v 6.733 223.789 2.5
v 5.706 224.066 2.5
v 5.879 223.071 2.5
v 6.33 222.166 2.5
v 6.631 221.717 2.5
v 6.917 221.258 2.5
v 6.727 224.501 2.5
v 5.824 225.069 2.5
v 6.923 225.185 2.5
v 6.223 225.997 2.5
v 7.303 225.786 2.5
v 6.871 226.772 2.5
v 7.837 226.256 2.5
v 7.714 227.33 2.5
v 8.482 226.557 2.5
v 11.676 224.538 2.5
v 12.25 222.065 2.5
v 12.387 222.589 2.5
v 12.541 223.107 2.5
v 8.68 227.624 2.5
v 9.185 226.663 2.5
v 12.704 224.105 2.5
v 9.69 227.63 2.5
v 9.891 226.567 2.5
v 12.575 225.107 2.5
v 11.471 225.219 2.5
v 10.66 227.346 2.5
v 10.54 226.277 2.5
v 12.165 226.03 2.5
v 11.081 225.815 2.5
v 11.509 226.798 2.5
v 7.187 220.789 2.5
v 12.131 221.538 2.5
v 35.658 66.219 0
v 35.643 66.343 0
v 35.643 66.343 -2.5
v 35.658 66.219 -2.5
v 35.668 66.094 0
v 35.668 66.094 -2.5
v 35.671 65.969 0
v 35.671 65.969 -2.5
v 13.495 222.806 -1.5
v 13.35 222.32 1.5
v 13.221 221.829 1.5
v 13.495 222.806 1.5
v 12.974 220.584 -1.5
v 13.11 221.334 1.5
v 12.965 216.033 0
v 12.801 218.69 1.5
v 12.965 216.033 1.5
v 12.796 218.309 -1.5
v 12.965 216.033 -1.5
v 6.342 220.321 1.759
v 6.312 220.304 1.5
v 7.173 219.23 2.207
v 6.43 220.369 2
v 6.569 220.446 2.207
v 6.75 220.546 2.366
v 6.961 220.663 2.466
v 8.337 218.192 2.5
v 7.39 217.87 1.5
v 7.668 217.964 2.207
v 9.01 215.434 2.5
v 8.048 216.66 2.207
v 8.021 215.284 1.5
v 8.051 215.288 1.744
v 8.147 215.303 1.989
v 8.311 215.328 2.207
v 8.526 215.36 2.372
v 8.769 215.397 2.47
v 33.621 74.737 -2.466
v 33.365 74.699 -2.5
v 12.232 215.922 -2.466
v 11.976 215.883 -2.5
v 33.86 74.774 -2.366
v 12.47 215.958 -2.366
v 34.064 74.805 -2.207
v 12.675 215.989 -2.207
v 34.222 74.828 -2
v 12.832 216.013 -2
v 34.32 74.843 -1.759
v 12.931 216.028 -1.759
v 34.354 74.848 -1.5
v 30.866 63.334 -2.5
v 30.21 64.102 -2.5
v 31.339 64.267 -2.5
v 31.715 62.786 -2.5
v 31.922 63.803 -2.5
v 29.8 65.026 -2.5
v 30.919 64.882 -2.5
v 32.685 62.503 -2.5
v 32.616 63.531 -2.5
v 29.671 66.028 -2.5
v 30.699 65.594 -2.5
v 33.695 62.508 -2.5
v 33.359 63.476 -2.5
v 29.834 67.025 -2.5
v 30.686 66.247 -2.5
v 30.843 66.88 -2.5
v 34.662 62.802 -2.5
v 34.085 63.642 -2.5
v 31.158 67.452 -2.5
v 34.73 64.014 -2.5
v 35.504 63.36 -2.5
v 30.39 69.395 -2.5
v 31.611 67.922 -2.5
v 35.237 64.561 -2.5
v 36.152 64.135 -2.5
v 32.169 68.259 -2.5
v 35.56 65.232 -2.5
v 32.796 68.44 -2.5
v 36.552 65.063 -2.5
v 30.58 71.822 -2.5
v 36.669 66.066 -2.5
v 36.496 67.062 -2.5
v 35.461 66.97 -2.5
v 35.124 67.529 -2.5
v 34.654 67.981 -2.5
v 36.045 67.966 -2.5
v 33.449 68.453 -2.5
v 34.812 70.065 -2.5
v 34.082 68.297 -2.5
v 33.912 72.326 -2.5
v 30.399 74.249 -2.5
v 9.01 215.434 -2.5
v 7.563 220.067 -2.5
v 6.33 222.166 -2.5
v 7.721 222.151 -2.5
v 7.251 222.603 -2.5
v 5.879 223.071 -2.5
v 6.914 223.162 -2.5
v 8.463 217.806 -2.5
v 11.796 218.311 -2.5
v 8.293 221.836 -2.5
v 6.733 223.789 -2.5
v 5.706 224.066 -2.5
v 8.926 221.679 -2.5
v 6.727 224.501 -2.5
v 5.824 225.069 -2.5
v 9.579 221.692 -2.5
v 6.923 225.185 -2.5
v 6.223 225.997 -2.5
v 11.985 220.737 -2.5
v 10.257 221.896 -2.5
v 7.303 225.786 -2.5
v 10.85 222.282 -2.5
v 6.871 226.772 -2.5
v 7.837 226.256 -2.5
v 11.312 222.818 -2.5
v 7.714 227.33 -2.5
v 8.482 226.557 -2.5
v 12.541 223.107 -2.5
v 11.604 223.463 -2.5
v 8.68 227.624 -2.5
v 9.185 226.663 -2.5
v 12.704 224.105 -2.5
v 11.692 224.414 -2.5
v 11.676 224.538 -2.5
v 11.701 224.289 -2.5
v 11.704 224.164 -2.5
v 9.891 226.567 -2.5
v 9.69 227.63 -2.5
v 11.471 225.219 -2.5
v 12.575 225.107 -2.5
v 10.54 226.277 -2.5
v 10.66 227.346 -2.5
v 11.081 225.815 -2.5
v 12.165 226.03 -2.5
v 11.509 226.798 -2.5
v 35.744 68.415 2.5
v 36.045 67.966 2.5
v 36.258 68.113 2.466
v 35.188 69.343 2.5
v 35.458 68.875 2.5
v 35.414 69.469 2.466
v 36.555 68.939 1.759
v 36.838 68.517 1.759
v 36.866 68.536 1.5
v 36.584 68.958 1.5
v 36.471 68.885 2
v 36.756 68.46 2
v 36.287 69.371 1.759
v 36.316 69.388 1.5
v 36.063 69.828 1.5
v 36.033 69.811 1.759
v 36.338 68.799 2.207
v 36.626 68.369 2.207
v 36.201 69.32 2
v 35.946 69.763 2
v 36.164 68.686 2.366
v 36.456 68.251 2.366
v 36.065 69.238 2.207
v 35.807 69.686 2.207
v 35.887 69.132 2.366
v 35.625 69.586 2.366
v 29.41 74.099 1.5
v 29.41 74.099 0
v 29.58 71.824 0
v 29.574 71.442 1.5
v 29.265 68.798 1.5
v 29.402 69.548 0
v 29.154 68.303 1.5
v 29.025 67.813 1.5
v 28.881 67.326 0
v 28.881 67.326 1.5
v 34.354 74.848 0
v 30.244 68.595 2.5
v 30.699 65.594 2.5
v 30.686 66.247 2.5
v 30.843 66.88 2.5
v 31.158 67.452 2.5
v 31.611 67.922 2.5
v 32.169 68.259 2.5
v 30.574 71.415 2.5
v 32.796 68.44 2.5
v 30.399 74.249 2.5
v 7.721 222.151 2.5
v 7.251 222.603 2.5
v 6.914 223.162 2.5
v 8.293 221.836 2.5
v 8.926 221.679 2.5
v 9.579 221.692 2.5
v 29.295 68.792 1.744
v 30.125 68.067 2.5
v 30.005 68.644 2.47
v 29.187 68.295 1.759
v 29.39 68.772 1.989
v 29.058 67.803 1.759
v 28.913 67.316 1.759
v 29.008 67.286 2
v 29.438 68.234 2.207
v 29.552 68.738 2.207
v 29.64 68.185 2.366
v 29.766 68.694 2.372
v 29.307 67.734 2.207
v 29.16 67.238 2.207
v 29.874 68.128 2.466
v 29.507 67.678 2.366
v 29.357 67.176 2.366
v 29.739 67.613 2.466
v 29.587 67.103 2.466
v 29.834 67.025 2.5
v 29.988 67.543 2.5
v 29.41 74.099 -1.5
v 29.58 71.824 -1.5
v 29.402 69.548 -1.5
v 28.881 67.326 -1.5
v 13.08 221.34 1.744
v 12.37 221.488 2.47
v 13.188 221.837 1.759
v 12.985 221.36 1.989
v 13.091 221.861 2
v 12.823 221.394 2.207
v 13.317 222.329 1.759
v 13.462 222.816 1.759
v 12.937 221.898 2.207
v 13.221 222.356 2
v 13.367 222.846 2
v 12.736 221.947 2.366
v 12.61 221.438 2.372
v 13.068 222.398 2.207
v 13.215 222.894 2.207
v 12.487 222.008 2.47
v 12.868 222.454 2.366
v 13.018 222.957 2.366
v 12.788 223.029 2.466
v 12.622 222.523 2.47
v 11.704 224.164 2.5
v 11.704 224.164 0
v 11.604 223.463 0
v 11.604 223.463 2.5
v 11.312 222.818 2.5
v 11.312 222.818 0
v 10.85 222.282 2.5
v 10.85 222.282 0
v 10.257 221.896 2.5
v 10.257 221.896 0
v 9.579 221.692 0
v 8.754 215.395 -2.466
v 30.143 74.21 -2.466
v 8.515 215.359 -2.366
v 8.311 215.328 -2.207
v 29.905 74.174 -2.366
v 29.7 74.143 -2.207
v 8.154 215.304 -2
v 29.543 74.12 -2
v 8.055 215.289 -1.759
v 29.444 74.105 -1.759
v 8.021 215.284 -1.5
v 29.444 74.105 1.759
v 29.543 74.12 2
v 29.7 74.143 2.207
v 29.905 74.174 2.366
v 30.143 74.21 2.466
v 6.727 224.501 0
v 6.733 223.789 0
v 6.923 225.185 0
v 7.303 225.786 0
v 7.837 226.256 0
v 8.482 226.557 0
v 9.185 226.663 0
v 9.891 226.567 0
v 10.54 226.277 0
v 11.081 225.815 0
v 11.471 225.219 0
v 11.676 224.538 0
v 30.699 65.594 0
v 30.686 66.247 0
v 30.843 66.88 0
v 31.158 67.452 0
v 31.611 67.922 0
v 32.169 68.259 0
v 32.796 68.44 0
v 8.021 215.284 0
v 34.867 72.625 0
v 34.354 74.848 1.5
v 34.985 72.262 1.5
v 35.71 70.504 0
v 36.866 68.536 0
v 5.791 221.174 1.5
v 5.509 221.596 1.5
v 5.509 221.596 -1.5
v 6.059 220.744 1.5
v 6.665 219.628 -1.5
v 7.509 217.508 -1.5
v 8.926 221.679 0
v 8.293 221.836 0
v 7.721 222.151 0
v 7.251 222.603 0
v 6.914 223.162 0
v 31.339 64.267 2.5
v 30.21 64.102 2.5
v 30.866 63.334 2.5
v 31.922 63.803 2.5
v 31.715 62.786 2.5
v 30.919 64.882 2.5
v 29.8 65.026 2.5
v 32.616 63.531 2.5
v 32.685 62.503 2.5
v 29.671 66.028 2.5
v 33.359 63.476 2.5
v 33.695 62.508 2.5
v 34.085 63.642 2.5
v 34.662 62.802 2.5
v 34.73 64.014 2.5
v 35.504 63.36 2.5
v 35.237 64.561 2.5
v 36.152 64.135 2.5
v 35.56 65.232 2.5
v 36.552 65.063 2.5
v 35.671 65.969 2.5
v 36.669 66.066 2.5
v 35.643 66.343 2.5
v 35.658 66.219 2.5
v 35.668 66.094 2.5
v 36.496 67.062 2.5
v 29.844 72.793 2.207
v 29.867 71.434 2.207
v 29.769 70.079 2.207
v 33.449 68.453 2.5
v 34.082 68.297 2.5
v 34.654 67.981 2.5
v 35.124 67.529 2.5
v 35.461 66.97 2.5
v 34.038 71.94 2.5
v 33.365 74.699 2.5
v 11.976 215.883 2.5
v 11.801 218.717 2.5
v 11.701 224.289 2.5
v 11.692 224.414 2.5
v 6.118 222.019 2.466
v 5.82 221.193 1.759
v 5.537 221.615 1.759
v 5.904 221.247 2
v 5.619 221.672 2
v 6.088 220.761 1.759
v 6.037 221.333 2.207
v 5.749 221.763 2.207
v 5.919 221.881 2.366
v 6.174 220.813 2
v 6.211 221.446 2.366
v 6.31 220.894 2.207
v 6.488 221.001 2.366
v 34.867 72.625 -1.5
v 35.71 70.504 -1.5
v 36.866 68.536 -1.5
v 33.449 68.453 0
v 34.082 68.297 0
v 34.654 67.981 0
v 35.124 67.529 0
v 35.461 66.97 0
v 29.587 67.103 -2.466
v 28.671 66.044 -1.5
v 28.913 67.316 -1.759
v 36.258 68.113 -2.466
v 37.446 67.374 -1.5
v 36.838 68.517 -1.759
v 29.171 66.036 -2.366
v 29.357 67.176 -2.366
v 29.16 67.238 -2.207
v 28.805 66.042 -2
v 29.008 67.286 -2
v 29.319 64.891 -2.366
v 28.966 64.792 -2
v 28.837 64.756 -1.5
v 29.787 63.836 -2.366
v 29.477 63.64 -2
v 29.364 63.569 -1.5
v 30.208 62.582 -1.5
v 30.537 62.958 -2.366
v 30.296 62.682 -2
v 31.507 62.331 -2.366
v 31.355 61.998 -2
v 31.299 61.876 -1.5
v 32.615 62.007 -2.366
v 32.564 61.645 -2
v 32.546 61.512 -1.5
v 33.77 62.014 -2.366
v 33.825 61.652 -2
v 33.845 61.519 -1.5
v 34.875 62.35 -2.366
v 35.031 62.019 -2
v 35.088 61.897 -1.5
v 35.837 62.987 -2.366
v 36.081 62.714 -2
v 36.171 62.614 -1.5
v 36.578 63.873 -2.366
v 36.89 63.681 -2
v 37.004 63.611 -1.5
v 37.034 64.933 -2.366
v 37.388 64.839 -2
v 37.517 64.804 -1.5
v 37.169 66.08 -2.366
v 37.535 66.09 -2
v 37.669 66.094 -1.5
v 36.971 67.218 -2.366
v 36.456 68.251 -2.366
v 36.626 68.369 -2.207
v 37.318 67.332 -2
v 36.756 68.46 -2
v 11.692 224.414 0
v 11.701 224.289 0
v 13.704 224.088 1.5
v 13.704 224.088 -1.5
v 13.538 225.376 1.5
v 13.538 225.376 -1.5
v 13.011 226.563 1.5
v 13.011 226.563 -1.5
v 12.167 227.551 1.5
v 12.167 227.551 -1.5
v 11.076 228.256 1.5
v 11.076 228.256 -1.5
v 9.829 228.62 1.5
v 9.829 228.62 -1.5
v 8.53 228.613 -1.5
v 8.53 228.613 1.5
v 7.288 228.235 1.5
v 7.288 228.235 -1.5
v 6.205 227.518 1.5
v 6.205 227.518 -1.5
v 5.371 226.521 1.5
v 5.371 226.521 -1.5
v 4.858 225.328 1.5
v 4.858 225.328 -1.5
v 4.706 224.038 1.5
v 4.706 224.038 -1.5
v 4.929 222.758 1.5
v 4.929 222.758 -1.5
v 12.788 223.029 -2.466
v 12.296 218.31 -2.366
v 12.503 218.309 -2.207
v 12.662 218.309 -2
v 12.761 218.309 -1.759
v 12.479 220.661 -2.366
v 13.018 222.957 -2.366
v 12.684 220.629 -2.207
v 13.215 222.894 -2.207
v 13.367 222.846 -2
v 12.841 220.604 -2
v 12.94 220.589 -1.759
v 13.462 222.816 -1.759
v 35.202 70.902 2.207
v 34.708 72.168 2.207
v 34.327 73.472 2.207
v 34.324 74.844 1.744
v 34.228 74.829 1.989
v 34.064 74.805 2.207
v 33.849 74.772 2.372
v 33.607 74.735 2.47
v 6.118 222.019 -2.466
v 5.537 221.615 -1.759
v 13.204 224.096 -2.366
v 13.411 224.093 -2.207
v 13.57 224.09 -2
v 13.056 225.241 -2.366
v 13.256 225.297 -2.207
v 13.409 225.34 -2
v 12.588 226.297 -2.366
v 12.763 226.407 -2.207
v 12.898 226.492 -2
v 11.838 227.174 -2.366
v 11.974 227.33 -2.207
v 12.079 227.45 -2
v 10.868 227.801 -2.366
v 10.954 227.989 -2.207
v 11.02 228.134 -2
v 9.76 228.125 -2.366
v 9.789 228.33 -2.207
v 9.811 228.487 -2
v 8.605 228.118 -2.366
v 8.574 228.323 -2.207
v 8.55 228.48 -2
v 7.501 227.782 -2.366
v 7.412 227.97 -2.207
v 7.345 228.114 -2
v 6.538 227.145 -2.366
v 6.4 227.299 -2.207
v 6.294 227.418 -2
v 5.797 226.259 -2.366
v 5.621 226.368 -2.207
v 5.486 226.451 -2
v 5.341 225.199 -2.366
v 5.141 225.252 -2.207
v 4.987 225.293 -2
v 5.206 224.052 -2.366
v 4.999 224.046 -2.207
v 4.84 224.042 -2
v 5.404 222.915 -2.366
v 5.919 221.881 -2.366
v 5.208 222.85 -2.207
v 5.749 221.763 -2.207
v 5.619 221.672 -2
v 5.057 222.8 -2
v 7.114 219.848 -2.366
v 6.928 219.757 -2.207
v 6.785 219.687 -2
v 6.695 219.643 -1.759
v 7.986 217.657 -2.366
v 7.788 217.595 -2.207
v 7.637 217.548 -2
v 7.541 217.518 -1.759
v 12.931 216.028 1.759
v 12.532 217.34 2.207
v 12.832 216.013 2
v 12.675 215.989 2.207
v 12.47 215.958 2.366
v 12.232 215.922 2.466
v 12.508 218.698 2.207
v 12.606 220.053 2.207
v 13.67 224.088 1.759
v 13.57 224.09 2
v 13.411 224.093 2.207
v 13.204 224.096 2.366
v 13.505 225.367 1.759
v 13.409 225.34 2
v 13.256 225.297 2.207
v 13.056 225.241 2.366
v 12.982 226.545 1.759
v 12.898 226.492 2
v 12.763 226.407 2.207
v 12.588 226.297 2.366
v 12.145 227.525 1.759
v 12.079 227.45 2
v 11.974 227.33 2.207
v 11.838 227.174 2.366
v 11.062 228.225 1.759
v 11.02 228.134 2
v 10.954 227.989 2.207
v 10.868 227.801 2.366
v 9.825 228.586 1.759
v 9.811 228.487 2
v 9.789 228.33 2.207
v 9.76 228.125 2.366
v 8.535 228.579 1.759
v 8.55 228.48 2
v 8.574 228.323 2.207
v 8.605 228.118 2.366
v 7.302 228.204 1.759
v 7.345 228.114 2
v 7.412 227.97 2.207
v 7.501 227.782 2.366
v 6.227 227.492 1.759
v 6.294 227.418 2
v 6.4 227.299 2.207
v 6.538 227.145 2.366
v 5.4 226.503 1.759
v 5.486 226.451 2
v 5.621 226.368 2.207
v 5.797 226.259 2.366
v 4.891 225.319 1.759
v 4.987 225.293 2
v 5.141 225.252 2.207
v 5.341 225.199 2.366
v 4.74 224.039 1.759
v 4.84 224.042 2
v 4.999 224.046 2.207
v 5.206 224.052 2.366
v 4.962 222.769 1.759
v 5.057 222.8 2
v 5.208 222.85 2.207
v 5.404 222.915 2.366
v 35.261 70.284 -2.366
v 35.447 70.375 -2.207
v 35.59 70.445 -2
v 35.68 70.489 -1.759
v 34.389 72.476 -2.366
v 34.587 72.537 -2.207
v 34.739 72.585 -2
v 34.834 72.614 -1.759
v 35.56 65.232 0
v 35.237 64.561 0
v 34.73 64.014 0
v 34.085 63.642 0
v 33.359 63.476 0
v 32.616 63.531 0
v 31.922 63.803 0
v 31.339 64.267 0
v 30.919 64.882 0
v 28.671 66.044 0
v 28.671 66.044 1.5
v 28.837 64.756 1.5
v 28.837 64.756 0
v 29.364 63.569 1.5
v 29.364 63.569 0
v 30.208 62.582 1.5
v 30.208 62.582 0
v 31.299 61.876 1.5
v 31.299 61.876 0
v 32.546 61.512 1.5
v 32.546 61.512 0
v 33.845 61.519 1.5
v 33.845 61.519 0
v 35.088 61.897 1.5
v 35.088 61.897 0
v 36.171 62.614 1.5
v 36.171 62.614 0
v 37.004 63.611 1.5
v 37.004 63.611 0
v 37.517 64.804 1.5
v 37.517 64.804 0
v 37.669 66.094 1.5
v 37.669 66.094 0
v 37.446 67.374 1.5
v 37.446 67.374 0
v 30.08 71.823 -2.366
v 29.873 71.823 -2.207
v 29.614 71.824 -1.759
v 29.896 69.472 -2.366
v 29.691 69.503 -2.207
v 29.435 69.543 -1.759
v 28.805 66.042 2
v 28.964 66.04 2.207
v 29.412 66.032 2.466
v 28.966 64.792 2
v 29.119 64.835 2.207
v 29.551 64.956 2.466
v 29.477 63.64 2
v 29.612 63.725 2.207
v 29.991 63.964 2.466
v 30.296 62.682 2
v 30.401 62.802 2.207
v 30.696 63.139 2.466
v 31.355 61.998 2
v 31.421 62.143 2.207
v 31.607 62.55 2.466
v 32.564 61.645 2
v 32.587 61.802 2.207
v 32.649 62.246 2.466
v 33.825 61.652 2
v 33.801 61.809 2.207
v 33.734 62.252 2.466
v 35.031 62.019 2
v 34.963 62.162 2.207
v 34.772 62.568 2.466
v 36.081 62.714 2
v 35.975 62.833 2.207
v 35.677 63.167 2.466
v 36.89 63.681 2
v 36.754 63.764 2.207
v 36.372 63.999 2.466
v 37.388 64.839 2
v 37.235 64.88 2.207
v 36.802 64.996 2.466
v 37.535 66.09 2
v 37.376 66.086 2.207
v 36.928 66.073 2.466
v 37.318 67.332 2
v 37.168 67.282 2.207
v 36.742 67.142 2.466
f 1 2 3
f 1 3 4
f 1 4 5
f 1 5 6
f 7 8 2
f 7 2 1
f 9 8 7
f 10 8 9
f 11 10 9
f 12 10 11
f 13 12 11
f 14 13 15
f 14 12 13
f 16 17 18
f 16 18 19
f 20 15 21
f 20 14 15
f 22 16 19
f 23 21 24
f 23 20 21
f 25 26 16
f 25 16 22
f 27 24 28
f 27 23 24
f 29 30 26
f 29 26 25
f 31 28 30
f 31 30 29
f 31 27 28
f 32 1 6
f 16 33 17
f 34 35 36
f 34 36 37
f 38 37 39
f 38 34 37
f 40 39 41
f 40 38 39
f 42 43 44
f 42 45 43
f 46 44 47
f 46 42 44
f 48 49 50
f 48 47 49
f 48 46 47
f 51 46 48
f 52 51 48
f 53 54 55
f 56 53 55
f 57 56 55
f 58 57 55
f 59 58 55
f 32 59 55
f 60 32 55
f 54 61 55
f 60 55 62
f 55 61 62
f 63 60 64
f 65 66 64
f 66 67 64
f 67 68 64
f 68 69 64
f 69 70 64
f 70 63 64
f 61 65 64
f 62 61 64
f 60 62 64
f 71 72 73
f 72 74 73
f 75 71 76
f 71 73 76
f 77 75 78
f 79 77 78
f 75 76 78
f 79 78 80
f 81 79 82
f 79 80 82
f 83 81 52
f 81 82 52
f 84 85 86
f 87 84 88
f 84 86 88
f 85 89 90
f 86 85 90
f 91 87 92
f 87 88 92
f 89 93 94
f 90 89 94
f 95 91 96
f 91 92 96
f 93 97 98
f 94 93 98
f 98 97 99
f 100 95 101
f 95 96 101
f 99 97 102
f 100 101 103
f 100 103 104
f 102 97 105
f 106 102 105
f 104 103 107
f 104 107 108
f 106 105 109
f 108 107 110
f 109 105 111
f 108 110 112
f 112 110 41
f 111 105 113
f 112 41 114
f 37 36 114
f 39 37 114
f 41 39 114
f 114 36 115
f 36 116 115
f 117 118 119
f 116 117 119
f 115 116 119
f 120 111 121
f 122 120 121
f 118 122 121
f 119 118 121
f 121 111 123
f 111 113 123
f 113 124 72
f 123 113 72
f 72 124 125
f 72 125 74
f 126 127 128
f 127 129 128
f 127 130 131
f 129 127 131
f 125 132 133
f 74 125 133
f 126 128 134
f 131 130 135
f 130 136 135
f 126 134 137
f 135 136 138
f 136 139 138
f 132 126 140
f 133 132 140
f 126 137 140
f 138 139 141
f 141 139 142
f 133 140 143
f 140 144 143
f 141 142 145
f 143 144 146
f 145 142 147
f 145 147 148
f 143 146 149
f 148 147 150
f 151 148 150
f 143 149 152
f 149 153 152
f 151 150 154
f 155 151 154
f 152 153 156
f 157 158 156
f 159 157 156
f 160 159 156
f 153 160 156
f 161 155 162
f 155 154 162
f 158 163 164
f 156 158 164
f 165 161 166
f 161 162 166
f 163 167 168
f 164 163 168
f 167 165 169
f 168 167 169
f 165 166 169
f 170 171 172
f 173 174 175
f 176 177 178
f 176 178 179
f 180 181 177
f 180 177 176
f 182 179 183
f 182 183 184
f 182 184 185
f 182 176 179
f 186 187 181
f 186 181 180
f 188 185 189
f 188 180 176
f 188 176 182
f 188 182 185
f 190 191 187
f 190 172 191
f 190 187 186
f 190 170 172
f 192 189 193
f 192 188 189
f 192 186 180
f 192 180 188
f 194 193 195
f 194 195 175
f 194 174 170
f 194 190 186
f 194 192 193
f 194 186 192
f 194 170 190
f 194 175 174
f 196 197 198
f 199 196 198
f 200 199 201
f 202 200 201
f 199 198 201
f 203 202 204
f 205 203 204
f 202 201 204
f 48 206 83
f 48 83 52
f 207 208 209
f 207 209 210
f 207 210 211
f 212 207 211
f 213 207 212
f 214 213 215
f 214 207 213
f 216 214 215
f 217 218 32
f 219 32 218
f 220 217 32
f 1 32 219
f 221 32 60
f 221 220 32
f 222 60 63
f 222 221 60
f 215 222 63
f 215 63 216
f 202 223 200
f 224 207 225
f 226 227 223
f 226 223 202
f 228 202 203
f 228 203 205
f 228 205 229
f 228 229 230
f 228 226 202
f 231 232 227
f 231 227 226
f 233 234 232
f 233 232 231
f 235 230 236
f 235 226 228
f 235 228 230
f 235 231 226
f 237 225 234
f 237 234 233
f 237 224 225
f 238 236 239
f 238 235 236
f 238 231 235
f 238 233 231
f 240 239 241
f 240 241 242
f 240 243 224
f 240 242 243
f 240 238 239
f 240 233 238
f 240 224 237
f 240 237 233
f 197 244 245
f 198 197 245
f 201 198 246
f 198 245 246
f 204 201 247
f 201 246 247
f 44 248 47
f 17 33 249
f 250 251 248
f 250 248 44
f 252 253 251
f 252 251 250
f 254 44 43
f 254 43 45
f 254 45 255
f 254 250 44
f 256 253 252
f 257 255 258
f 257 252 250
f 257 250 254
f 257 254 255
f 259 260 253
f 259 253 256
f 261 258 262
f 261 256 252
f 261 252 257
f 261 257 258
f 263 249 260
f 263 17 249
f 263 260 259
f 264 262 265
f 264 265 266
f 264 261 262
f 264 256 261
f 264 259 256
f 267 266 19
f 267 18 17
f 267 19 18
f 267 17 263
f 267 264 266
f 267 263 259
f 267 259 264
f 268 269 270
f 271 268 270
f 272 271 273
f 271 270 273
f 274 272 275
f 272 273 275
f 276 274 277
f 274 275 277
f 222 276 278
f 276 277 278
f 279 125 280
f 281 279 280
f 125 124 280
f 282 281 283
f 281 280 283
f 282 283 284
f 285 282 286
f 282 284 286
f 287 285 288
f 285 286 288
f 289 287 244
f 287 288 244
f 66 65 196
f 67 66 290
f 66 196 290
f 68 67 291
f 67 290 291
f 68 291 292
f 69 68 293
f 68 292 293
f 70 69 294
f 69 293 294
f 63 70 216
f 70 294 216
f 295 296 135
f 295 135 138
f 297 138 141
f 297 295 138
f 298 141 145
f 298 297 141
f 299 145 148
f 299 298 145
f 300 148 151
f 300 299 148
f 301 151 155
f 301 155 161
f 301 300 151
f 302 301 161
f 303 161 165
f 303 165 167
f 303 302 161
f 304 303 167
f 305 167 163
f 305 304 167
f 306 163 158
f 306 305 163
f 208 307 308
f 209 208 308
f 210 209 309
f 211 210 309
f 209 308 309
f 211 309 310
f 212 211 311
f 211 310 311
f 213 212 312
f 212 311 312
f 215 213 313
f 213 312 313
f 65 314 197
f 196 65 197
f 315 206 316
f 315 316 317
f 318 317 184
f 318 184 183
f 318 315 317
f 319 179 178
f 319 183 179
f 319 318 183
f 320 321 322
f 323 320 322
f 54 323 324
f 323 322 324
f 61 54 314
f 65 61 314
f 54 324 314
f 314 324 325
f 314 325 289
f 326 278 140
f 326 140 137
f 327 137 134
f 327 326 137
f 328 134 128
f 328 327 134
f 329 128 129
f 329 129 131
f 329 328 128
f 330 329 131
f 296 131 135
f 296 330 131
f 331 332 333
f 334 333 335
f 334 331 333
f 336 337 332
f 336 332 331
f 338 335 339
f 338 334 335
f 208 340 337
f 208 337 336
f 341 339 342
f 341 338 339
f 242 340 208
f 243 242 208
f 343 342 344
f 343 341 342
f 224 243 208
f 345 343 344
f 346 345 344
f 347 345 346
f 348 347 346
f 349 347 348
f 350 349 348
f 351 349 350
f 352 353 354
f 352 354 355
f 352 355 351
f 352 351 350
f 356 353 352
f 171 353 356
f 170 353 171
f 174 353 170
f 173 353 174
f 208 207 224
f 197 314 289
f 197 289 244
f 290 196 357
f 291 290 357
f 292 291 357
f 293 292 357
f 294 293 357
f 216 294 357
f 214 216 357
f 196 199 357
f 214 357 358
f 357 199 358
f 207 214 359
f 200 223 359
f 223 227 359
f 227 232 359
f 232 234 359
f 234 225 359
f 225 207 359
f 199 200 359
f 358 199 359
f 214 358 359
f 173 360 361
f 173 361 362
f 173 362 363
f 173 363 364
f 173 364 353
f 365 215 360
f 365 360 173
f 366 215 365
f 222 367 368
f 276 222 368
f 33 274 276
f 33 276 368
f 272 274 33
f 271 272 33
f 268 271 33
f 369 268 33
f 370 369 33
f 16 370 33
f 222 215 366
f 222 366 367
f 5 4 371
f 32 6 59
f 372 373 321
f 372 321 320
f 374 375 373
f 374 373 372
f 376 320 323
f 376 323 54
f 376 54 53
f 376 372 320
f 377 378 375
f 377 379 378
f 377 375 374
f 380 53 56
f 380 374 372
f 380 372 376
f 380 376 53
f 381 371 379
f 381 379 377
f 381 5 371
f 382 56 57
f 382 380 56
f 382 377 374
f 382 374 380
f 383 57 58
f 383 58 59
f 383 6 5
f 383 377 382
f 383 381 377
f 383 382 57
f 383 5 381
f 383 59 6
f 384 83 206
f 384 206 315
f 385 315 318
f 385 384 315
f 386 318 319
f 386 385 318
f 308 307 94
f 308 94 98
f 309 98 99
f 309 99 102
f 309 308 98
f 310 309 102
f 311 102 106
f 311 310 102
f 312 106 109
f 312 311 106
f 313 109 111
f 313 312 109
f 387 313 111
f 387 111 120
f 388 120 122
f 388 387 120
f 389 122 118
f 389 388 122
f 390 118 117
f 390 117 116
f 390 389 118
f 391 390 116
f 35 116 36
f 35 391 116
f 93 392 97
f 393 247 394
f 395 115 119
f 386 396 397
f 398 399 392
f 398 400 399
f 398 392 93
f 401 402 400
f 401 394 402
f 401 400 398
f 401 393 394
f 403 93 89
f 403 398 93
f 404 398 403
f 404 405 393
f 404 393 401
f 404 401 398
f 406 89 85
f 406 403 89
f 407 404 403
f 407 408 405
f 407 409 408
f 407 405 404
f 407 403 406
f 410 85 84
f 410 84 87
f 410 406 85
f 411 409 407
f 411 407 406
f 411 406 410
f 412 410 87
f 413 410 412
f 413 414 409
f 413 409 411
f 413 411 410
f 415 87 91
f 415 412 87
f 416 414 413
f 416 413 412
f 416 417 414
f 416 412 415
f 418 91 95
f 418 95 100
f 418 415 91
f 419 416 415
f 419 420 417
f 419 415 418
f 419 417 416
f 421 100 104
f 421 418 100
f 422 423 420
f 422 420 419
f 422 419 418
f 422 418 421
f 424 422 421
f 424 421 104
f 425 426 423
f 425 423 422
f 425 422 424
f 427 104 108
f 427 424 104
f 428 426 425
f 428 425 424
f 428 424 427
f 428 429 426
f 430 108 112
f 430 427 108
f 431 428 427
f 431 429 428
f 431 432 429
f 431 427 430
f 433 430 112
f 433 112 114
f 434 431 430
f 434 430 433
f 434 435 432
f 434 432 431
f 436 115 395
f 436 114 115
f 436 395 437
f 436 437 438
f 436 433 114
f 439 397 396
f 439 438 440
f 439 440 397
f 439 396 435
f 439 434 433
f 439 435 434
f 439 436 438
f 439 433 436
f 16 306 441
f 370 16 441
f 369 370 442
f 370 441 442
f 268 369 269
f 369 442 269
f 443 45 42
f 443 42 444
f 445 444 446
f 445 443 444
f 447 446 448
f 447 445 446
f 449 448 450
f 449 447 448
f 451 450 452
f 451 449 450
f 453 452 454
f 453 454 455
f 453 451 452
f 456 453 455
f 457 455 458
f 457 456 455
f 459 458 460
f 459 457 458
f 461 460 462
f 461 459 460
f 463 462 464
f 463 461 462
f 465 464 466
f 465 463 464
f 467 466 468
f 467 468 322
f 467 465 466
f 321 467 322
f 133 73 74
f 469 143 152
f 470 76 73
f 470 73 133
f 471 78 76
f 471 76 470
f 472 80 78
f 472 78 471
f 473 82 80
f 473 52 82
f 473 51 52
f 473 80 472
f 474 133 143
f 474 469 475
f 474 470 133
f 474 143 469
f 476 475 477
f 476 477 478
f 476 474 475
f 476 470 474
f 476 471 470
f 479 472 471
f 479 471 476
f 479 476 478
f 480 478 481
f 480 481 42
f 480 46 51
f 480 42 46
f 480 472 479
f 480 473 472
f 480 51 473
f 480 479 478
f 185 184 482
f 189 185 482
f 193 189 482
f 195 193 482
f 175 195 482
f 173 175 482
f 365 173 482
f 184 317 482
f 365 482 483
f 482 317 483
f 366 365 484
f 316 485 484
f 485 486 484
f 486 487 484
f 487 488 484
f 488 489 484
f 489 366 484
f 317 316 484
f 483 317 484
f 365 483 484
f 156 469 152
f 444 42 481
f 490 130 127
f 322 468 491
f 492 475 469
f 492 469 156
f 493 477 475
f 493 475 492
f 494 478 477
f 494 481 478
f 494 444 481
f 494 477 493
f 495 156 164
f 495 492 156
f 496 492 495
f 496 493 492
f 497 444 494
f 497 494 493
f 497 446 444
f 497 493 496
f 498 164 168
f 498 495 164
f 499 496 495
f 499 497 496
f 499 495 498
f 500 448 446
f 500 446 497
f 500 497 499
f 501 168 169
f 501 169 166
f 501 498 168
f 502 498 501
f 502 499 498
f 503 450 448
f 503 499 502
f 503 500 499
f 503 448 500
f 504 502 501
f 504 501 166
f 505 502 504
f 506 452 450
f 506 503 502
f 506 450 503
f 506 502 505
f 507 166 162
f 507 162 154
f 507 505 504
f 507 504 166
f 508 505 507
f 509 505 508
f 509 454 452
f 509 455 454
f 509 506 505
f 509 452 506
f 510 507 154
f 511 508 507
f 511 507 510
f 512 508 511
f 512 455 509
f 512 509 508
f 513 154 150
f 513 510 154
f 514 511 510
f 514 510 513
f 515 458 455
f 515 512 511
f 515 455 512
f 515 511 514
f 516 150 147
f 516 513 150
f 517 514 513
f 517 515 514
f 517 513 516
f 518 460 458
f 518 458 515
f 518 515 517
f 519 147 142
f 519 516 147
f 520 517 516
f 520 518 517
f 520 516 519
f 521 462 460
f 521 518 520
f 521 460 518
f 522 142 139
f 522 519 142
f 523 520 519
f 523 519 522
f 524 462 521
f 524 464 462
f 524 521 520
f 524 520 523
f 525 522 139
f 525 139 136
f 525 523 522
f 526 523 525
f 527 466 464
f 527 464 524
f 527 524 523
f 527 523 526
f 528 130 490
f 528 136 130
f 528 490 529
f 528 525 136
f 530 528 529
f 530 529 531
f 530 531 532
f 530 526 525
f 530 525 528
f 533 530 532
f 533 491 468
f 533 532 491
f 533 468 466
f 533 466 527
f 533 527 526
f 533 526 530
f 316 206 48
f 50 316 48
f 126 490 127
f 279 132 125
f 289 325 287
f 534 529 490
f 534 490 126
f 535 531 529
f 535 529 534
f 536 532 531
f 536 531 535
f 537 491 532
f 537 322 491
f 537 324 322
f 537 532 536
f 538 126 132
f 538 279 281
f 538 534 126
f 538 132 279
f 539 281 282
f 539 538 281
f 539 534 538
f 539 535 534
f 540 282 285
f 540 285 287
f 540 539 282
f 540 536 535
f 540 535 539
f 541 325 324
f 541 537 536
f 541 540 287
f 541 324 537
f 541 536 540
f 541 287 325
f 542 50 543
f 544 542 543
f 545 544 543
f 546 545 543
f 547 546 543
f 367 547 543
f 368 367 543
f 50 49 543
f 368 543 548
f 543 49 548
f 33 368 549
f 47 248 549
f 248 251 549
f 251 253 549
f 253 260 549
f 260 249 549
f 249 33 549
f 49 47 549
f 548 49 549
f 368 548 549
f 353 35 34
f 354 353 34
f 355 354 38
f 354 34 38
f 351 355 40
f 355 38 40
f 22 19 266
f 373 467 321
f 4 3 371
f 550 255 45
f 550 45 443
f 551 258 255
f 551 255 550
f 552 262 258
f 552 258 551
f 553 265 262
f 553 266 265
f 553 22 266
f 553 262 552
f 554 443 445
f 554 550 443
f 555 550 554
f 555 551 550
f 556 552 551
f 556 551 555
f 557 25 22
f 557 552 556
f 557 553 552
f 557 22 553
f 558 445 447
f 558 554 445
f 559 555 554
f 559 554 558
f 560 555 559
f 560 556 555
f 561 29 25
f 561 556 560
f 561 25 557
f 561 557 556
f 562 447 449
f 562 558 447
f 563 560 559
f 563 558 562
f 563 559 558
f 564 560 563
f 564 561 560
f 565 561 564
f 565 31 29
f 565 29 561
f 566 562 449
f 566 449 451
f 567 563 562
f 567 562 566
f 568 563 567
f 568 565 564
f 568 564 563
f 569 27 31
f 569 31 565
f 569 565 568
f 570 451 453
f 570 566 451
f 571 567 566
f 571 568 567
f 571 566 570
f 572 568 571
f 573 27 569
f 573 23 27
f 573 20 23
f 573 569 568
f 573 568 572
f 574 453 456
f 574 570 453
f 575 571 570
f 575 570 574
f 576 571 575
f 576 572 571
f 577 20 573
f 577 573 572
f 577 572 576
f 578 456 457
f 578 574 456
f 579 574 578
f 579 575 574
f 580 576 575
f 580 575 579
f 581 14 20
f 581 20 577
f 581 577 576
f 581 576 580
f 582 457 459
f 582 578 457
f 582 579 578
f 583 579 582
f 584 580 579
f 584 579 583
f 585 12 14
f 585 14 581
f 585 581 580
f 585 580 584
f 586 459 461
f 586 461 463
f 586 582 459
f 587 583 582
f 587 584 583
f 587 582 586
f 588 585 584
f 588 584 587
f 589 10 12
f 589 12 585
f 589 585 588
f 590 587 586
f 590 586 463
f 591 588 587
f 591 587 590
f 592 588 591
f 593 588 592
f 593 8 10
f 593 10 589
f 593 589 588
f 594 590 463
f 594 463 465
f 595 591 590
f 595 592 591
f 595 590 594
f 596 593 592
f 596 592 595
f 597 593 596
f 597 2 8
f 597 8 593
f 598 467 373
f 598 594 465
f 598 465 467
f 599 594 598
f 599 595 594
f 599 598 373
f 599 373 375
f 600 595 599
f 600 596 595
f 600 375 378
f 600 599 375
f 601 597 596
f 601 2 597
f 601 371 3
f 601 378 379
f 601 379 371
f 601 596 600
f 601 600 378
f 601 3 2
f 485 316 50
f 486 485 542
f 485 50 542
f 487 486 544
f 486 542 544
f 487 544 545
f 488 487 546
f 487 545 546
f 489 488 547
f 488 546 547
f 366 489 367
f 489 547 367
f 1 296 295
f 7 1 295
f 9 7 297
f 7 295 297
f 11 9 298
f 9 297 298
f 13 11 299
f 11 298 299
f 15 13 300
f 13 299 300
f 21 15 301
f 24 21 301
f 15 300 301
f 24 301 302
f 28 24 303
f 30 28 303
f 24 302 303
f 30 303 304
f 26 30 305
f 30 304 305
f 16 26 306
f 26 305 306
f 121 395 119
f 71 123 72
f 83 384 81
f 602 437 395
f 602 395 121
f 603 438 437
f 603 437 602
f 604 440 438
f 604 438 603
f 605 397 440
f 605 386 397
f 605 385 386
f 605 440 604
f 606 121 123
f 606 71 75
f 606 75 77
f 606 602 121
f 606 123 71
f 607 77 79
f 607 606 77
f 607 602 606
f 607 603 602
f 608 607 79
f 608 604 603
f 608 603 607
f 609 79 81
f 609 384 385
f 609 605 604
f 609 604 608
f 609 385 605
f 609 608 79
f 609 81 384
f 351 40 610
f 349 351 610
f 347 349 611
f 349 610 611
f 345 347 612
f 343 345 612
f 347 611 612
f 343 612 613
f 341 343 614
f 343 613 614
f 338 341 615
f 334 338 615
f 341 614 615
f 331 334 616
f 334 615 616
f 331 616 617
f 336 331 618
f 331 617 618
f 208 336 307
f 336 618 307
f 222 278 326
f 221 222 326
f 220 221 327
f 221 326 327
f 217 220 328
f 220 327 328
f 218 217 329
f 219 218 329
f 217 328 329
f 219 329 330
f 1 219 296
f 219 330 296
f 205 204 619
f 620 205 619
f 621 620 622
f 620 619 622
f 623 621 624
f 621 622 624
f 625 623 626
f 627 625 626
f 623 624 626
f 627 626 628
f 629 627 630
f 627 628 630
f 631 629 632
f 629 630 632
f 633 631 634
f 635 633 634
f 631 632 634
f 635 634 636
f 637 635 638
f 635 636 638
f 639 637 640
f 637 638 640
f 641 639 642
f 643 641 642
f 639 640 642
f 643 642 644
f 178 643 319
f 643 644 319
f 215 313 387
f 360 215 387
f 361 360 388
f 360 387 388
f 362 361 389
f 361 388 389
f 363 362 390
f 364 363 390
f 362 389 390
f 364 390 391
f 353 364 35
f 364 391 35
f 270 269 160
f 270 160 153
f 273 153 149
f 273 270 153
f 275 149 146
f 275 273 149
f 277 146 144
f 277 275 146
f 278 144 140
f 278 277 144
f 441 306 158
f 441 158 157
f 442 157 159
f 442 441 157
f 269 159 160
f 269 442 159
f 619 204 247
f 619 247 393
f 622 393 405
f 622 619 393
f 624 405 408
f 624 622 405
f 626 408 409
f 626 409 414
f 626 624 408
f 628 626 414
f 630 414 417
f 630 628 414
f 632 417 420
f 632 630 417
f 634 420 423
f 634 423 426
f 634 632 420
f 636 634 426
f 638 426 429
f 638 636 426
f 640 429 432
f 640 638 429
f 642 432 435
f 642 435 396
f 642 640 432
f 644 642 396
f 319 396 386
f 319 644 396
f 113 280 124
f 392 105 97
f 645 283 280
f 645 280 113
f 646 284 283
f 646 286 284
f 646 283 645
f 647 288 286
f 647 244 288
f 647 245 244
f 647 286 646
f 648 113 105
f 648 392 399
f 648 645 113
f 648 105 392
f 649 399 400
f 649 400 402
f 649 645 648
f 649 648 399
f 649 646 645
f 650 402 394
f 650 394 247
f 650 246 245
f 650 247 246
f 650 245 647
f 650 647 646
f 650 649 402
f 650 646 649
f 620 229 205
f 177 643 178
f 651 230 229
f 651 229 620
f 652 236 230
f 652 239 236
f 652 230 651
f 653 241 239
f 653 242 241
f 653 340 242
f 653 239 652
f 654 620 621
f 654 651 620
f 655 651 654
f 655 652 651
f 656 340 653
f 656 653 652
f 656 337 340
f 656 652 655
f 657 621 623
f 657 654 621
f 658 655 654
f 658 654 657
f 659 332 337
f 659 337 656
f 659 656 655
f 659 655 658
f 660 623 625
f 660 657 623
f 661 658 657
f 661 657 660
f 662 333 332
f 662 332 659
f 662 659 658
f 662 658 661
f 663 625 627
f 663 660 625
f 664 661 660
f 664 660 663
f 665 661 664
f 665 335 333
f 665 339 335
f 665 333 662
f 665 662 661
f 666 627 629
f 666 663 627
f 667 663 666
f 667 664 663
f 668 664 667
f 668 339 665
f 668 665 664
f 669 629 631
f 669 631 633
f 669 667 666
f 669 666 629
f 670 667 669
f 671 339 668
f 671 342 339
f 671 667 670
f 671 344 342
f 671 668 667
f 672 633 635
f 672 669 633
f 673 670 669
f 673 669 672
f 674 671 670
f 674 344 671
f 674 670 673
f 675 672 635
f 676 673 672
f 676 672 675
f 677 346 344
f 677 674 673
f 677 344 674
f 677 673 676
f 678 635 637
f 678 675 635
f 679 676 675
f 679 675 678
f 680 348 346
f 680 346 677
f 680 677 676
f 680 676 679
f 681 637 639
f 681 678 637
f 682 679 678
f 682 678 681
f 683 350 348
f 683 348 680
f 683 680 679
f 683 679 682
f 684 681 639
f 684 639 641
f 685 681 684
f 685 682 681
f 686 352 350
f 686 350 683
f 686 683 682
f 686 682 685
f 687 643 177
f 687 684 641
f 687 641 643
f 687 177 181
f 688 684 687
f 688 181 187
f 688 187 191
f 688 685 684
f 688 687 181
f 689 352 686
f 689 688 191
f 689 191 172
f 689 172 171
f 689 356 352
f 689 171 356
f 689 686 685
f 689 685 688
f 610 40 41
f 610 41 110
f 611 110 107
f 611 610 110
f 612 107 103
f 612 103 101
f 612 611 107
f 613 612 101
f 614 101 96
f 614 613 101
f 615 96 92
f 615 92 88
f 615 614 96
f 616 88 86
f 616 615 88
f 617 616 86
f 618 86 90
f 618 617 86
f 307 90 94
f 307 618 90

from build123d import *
from build123d.topology import SkipClean

# Parameters (mm, degrees)
BOSS_EXTRUDE2_DEPTH = 2.5
FILLET4_R           = 15
FILLET3_R           = 1


with BuildPart() as part:
    # Sketch3 → Boss-Extrude2 (new, symmetric)
    with SkipClean():  # the faces are left unmerged after this step: merging them gives an invalid solid
        with BuildSketch(Plane.XY):
            with BuildLine():
                ThreePointArc((30.698969170125505, 65.59418036163315), (31.158147399926214, 67.45168422123758), (32.79628901519803, 68.44044975637873))
                Line((32.79628901519794, 68.44044975637871), (9.57885297533118, 221.6917161907371))
                ThreePointArc((9.578852975331099, 221.69171619073705), (7.7213491157267296, 222.15089442053778), (6.732583580585612, 223.78903603580954))
                Line((6.732583580585612, 223.78903603580954), (7.293046103556714, 220.08959259654122))
                Line((7.293046103556714, 220.08959259654122), (30.138506647154426, 69.29362380090143))
                Line((30.138506647154426, 69.29362380090143), (30.698969170125523, 65.59418036163316))
            make_face()
            with BuildLine():
                Line((9.57885297533118, 221.6917161907371), (32.79628901519794, 68.44044975637871))
                ThreePointArc((32.79628901519803, 68.44044975637873), (34.65379287480238, 67.981271526578), (35.642558409943504, 66.34312991130628))
                Line((35.64255840994353, 66.34312991130628), (35.08209588697243, 70.04257335057454))
                Line((35.08209588697243, 70.04257335057454), (12.236635343374711, 220.8385421462144))
                Line((12.236635343374711, 220.8385421462144), (11.676172820403618, 224.53798558548266))
                ThreePointArc((11.67617282040362, 224.53798558548266), (11.697316883031004, 224.35127855311998), (11.704378200494617, 224.16351081064607))
                ThreePointArc((11.704378200494617, 224.16351081064607), (11.099923891989707, 222.5335088071337), (9.578852975331099, 221.69171619073705))
            make_face()
            with BuildLine():
                Line((35.08209588697243, 70.04257335057454), (35.64255840994353, 66.34312991130628))
                ThreePointArc((35.64255840994353, 66.34312991130628), (35.66370247257092, 66.1564228789436), (35.67076379003453, 65.9686551364697))
                ThreePointArc((35.67076379003453, 65.9686551364697), (33.35853153250842, 63.47571645393335), (30.698969170125526, 65.59418036163315))
                Line((30.698969170125523, 65.59418036163316), (30.138506647154426, 69.29362380090143))
                ThreePointArc((30.138506647154404, 69.29362380090143), (33.84481838474032, 61.51942482063349), (35.082095886972446, 70.04257335057454))
            make_face()
            with BuildLine():
                Line((7.293046103556714, 220.08959259654122), (6.732583580585612, 223.78903603580954))
                ThreePointArc((6.732583580585617, 223.78903603580954), (8.82990342565806, 226.6353054305551), (11.676172820403616, 224.53798558548266))
                Line((11.676172820403618, 224.53798558548266), (12.236635343374711, 220.8385421462144))
                ThreePointArc((12.23663534337469, 220.8385421462144), (8.530323605788727, 228.61274112648235), (7.293046103556694, 220.08959259654122))
            make_face()
        extrude(amount=BOSS_EXTRUDE2_DEPTH, both=True)

    # Fillet4
    fillet4_edges = [part.edges().sort_by_distance(p)[0] for p in [
        (35.08209588697243, 70.04257335057454, -1.25),
        (30.138506647154415, 69.29362380090143, 0),
        (7.293046103556704, 220.08959259654122, 0),
        (12.236635343374711, 220.8385421462144, -1.25),
    ]]
    fillet(fillet4_edges, radius=FILLET4_R)

    # Fillet3
    fillet3_edges = [part.edges().sort_by_distance(p)[0] for p in [
        (33.84481838474031, 61.51942482063349, -2.5),
        (33.84481838474031, 61.51942482063349, 2.5),
        (18.71577637535555, 144.69160819872144, -2.5),
        (18.715776375355546, 144.69160819872144, 2.5),
        (23.659365615173567, 145.4405577483945, -2.5),
        (23.659365615173567, 145.4405577483945, 2.5),
        (8.530323605788741, 228.61274112648235, -2.5),
        (8.530323605788741, 228.61274112648235, 2.5),
        (29.53395807325908, 70.68257566844231, -2.5),
        (29.53395807325908, 70.68257566844231, 2.5),
        (35.24810850264601, 71.54826458053549, -2.5),
        (35.24810850264601, 71.54826458053549, 2.5),
        (12.841183917270046, 219.44959027867358, -2.5),
        (12.841183917270046, 219.44959027867358, 2.5),
        (7.127033487882997, 218.58390136658036, -2.5),
        (7.127033487882997, 218.58390136658036, 2.5),
    ]]
    fillet(fillet3_edges, radius=FILLET3_R)


solid = part.part
